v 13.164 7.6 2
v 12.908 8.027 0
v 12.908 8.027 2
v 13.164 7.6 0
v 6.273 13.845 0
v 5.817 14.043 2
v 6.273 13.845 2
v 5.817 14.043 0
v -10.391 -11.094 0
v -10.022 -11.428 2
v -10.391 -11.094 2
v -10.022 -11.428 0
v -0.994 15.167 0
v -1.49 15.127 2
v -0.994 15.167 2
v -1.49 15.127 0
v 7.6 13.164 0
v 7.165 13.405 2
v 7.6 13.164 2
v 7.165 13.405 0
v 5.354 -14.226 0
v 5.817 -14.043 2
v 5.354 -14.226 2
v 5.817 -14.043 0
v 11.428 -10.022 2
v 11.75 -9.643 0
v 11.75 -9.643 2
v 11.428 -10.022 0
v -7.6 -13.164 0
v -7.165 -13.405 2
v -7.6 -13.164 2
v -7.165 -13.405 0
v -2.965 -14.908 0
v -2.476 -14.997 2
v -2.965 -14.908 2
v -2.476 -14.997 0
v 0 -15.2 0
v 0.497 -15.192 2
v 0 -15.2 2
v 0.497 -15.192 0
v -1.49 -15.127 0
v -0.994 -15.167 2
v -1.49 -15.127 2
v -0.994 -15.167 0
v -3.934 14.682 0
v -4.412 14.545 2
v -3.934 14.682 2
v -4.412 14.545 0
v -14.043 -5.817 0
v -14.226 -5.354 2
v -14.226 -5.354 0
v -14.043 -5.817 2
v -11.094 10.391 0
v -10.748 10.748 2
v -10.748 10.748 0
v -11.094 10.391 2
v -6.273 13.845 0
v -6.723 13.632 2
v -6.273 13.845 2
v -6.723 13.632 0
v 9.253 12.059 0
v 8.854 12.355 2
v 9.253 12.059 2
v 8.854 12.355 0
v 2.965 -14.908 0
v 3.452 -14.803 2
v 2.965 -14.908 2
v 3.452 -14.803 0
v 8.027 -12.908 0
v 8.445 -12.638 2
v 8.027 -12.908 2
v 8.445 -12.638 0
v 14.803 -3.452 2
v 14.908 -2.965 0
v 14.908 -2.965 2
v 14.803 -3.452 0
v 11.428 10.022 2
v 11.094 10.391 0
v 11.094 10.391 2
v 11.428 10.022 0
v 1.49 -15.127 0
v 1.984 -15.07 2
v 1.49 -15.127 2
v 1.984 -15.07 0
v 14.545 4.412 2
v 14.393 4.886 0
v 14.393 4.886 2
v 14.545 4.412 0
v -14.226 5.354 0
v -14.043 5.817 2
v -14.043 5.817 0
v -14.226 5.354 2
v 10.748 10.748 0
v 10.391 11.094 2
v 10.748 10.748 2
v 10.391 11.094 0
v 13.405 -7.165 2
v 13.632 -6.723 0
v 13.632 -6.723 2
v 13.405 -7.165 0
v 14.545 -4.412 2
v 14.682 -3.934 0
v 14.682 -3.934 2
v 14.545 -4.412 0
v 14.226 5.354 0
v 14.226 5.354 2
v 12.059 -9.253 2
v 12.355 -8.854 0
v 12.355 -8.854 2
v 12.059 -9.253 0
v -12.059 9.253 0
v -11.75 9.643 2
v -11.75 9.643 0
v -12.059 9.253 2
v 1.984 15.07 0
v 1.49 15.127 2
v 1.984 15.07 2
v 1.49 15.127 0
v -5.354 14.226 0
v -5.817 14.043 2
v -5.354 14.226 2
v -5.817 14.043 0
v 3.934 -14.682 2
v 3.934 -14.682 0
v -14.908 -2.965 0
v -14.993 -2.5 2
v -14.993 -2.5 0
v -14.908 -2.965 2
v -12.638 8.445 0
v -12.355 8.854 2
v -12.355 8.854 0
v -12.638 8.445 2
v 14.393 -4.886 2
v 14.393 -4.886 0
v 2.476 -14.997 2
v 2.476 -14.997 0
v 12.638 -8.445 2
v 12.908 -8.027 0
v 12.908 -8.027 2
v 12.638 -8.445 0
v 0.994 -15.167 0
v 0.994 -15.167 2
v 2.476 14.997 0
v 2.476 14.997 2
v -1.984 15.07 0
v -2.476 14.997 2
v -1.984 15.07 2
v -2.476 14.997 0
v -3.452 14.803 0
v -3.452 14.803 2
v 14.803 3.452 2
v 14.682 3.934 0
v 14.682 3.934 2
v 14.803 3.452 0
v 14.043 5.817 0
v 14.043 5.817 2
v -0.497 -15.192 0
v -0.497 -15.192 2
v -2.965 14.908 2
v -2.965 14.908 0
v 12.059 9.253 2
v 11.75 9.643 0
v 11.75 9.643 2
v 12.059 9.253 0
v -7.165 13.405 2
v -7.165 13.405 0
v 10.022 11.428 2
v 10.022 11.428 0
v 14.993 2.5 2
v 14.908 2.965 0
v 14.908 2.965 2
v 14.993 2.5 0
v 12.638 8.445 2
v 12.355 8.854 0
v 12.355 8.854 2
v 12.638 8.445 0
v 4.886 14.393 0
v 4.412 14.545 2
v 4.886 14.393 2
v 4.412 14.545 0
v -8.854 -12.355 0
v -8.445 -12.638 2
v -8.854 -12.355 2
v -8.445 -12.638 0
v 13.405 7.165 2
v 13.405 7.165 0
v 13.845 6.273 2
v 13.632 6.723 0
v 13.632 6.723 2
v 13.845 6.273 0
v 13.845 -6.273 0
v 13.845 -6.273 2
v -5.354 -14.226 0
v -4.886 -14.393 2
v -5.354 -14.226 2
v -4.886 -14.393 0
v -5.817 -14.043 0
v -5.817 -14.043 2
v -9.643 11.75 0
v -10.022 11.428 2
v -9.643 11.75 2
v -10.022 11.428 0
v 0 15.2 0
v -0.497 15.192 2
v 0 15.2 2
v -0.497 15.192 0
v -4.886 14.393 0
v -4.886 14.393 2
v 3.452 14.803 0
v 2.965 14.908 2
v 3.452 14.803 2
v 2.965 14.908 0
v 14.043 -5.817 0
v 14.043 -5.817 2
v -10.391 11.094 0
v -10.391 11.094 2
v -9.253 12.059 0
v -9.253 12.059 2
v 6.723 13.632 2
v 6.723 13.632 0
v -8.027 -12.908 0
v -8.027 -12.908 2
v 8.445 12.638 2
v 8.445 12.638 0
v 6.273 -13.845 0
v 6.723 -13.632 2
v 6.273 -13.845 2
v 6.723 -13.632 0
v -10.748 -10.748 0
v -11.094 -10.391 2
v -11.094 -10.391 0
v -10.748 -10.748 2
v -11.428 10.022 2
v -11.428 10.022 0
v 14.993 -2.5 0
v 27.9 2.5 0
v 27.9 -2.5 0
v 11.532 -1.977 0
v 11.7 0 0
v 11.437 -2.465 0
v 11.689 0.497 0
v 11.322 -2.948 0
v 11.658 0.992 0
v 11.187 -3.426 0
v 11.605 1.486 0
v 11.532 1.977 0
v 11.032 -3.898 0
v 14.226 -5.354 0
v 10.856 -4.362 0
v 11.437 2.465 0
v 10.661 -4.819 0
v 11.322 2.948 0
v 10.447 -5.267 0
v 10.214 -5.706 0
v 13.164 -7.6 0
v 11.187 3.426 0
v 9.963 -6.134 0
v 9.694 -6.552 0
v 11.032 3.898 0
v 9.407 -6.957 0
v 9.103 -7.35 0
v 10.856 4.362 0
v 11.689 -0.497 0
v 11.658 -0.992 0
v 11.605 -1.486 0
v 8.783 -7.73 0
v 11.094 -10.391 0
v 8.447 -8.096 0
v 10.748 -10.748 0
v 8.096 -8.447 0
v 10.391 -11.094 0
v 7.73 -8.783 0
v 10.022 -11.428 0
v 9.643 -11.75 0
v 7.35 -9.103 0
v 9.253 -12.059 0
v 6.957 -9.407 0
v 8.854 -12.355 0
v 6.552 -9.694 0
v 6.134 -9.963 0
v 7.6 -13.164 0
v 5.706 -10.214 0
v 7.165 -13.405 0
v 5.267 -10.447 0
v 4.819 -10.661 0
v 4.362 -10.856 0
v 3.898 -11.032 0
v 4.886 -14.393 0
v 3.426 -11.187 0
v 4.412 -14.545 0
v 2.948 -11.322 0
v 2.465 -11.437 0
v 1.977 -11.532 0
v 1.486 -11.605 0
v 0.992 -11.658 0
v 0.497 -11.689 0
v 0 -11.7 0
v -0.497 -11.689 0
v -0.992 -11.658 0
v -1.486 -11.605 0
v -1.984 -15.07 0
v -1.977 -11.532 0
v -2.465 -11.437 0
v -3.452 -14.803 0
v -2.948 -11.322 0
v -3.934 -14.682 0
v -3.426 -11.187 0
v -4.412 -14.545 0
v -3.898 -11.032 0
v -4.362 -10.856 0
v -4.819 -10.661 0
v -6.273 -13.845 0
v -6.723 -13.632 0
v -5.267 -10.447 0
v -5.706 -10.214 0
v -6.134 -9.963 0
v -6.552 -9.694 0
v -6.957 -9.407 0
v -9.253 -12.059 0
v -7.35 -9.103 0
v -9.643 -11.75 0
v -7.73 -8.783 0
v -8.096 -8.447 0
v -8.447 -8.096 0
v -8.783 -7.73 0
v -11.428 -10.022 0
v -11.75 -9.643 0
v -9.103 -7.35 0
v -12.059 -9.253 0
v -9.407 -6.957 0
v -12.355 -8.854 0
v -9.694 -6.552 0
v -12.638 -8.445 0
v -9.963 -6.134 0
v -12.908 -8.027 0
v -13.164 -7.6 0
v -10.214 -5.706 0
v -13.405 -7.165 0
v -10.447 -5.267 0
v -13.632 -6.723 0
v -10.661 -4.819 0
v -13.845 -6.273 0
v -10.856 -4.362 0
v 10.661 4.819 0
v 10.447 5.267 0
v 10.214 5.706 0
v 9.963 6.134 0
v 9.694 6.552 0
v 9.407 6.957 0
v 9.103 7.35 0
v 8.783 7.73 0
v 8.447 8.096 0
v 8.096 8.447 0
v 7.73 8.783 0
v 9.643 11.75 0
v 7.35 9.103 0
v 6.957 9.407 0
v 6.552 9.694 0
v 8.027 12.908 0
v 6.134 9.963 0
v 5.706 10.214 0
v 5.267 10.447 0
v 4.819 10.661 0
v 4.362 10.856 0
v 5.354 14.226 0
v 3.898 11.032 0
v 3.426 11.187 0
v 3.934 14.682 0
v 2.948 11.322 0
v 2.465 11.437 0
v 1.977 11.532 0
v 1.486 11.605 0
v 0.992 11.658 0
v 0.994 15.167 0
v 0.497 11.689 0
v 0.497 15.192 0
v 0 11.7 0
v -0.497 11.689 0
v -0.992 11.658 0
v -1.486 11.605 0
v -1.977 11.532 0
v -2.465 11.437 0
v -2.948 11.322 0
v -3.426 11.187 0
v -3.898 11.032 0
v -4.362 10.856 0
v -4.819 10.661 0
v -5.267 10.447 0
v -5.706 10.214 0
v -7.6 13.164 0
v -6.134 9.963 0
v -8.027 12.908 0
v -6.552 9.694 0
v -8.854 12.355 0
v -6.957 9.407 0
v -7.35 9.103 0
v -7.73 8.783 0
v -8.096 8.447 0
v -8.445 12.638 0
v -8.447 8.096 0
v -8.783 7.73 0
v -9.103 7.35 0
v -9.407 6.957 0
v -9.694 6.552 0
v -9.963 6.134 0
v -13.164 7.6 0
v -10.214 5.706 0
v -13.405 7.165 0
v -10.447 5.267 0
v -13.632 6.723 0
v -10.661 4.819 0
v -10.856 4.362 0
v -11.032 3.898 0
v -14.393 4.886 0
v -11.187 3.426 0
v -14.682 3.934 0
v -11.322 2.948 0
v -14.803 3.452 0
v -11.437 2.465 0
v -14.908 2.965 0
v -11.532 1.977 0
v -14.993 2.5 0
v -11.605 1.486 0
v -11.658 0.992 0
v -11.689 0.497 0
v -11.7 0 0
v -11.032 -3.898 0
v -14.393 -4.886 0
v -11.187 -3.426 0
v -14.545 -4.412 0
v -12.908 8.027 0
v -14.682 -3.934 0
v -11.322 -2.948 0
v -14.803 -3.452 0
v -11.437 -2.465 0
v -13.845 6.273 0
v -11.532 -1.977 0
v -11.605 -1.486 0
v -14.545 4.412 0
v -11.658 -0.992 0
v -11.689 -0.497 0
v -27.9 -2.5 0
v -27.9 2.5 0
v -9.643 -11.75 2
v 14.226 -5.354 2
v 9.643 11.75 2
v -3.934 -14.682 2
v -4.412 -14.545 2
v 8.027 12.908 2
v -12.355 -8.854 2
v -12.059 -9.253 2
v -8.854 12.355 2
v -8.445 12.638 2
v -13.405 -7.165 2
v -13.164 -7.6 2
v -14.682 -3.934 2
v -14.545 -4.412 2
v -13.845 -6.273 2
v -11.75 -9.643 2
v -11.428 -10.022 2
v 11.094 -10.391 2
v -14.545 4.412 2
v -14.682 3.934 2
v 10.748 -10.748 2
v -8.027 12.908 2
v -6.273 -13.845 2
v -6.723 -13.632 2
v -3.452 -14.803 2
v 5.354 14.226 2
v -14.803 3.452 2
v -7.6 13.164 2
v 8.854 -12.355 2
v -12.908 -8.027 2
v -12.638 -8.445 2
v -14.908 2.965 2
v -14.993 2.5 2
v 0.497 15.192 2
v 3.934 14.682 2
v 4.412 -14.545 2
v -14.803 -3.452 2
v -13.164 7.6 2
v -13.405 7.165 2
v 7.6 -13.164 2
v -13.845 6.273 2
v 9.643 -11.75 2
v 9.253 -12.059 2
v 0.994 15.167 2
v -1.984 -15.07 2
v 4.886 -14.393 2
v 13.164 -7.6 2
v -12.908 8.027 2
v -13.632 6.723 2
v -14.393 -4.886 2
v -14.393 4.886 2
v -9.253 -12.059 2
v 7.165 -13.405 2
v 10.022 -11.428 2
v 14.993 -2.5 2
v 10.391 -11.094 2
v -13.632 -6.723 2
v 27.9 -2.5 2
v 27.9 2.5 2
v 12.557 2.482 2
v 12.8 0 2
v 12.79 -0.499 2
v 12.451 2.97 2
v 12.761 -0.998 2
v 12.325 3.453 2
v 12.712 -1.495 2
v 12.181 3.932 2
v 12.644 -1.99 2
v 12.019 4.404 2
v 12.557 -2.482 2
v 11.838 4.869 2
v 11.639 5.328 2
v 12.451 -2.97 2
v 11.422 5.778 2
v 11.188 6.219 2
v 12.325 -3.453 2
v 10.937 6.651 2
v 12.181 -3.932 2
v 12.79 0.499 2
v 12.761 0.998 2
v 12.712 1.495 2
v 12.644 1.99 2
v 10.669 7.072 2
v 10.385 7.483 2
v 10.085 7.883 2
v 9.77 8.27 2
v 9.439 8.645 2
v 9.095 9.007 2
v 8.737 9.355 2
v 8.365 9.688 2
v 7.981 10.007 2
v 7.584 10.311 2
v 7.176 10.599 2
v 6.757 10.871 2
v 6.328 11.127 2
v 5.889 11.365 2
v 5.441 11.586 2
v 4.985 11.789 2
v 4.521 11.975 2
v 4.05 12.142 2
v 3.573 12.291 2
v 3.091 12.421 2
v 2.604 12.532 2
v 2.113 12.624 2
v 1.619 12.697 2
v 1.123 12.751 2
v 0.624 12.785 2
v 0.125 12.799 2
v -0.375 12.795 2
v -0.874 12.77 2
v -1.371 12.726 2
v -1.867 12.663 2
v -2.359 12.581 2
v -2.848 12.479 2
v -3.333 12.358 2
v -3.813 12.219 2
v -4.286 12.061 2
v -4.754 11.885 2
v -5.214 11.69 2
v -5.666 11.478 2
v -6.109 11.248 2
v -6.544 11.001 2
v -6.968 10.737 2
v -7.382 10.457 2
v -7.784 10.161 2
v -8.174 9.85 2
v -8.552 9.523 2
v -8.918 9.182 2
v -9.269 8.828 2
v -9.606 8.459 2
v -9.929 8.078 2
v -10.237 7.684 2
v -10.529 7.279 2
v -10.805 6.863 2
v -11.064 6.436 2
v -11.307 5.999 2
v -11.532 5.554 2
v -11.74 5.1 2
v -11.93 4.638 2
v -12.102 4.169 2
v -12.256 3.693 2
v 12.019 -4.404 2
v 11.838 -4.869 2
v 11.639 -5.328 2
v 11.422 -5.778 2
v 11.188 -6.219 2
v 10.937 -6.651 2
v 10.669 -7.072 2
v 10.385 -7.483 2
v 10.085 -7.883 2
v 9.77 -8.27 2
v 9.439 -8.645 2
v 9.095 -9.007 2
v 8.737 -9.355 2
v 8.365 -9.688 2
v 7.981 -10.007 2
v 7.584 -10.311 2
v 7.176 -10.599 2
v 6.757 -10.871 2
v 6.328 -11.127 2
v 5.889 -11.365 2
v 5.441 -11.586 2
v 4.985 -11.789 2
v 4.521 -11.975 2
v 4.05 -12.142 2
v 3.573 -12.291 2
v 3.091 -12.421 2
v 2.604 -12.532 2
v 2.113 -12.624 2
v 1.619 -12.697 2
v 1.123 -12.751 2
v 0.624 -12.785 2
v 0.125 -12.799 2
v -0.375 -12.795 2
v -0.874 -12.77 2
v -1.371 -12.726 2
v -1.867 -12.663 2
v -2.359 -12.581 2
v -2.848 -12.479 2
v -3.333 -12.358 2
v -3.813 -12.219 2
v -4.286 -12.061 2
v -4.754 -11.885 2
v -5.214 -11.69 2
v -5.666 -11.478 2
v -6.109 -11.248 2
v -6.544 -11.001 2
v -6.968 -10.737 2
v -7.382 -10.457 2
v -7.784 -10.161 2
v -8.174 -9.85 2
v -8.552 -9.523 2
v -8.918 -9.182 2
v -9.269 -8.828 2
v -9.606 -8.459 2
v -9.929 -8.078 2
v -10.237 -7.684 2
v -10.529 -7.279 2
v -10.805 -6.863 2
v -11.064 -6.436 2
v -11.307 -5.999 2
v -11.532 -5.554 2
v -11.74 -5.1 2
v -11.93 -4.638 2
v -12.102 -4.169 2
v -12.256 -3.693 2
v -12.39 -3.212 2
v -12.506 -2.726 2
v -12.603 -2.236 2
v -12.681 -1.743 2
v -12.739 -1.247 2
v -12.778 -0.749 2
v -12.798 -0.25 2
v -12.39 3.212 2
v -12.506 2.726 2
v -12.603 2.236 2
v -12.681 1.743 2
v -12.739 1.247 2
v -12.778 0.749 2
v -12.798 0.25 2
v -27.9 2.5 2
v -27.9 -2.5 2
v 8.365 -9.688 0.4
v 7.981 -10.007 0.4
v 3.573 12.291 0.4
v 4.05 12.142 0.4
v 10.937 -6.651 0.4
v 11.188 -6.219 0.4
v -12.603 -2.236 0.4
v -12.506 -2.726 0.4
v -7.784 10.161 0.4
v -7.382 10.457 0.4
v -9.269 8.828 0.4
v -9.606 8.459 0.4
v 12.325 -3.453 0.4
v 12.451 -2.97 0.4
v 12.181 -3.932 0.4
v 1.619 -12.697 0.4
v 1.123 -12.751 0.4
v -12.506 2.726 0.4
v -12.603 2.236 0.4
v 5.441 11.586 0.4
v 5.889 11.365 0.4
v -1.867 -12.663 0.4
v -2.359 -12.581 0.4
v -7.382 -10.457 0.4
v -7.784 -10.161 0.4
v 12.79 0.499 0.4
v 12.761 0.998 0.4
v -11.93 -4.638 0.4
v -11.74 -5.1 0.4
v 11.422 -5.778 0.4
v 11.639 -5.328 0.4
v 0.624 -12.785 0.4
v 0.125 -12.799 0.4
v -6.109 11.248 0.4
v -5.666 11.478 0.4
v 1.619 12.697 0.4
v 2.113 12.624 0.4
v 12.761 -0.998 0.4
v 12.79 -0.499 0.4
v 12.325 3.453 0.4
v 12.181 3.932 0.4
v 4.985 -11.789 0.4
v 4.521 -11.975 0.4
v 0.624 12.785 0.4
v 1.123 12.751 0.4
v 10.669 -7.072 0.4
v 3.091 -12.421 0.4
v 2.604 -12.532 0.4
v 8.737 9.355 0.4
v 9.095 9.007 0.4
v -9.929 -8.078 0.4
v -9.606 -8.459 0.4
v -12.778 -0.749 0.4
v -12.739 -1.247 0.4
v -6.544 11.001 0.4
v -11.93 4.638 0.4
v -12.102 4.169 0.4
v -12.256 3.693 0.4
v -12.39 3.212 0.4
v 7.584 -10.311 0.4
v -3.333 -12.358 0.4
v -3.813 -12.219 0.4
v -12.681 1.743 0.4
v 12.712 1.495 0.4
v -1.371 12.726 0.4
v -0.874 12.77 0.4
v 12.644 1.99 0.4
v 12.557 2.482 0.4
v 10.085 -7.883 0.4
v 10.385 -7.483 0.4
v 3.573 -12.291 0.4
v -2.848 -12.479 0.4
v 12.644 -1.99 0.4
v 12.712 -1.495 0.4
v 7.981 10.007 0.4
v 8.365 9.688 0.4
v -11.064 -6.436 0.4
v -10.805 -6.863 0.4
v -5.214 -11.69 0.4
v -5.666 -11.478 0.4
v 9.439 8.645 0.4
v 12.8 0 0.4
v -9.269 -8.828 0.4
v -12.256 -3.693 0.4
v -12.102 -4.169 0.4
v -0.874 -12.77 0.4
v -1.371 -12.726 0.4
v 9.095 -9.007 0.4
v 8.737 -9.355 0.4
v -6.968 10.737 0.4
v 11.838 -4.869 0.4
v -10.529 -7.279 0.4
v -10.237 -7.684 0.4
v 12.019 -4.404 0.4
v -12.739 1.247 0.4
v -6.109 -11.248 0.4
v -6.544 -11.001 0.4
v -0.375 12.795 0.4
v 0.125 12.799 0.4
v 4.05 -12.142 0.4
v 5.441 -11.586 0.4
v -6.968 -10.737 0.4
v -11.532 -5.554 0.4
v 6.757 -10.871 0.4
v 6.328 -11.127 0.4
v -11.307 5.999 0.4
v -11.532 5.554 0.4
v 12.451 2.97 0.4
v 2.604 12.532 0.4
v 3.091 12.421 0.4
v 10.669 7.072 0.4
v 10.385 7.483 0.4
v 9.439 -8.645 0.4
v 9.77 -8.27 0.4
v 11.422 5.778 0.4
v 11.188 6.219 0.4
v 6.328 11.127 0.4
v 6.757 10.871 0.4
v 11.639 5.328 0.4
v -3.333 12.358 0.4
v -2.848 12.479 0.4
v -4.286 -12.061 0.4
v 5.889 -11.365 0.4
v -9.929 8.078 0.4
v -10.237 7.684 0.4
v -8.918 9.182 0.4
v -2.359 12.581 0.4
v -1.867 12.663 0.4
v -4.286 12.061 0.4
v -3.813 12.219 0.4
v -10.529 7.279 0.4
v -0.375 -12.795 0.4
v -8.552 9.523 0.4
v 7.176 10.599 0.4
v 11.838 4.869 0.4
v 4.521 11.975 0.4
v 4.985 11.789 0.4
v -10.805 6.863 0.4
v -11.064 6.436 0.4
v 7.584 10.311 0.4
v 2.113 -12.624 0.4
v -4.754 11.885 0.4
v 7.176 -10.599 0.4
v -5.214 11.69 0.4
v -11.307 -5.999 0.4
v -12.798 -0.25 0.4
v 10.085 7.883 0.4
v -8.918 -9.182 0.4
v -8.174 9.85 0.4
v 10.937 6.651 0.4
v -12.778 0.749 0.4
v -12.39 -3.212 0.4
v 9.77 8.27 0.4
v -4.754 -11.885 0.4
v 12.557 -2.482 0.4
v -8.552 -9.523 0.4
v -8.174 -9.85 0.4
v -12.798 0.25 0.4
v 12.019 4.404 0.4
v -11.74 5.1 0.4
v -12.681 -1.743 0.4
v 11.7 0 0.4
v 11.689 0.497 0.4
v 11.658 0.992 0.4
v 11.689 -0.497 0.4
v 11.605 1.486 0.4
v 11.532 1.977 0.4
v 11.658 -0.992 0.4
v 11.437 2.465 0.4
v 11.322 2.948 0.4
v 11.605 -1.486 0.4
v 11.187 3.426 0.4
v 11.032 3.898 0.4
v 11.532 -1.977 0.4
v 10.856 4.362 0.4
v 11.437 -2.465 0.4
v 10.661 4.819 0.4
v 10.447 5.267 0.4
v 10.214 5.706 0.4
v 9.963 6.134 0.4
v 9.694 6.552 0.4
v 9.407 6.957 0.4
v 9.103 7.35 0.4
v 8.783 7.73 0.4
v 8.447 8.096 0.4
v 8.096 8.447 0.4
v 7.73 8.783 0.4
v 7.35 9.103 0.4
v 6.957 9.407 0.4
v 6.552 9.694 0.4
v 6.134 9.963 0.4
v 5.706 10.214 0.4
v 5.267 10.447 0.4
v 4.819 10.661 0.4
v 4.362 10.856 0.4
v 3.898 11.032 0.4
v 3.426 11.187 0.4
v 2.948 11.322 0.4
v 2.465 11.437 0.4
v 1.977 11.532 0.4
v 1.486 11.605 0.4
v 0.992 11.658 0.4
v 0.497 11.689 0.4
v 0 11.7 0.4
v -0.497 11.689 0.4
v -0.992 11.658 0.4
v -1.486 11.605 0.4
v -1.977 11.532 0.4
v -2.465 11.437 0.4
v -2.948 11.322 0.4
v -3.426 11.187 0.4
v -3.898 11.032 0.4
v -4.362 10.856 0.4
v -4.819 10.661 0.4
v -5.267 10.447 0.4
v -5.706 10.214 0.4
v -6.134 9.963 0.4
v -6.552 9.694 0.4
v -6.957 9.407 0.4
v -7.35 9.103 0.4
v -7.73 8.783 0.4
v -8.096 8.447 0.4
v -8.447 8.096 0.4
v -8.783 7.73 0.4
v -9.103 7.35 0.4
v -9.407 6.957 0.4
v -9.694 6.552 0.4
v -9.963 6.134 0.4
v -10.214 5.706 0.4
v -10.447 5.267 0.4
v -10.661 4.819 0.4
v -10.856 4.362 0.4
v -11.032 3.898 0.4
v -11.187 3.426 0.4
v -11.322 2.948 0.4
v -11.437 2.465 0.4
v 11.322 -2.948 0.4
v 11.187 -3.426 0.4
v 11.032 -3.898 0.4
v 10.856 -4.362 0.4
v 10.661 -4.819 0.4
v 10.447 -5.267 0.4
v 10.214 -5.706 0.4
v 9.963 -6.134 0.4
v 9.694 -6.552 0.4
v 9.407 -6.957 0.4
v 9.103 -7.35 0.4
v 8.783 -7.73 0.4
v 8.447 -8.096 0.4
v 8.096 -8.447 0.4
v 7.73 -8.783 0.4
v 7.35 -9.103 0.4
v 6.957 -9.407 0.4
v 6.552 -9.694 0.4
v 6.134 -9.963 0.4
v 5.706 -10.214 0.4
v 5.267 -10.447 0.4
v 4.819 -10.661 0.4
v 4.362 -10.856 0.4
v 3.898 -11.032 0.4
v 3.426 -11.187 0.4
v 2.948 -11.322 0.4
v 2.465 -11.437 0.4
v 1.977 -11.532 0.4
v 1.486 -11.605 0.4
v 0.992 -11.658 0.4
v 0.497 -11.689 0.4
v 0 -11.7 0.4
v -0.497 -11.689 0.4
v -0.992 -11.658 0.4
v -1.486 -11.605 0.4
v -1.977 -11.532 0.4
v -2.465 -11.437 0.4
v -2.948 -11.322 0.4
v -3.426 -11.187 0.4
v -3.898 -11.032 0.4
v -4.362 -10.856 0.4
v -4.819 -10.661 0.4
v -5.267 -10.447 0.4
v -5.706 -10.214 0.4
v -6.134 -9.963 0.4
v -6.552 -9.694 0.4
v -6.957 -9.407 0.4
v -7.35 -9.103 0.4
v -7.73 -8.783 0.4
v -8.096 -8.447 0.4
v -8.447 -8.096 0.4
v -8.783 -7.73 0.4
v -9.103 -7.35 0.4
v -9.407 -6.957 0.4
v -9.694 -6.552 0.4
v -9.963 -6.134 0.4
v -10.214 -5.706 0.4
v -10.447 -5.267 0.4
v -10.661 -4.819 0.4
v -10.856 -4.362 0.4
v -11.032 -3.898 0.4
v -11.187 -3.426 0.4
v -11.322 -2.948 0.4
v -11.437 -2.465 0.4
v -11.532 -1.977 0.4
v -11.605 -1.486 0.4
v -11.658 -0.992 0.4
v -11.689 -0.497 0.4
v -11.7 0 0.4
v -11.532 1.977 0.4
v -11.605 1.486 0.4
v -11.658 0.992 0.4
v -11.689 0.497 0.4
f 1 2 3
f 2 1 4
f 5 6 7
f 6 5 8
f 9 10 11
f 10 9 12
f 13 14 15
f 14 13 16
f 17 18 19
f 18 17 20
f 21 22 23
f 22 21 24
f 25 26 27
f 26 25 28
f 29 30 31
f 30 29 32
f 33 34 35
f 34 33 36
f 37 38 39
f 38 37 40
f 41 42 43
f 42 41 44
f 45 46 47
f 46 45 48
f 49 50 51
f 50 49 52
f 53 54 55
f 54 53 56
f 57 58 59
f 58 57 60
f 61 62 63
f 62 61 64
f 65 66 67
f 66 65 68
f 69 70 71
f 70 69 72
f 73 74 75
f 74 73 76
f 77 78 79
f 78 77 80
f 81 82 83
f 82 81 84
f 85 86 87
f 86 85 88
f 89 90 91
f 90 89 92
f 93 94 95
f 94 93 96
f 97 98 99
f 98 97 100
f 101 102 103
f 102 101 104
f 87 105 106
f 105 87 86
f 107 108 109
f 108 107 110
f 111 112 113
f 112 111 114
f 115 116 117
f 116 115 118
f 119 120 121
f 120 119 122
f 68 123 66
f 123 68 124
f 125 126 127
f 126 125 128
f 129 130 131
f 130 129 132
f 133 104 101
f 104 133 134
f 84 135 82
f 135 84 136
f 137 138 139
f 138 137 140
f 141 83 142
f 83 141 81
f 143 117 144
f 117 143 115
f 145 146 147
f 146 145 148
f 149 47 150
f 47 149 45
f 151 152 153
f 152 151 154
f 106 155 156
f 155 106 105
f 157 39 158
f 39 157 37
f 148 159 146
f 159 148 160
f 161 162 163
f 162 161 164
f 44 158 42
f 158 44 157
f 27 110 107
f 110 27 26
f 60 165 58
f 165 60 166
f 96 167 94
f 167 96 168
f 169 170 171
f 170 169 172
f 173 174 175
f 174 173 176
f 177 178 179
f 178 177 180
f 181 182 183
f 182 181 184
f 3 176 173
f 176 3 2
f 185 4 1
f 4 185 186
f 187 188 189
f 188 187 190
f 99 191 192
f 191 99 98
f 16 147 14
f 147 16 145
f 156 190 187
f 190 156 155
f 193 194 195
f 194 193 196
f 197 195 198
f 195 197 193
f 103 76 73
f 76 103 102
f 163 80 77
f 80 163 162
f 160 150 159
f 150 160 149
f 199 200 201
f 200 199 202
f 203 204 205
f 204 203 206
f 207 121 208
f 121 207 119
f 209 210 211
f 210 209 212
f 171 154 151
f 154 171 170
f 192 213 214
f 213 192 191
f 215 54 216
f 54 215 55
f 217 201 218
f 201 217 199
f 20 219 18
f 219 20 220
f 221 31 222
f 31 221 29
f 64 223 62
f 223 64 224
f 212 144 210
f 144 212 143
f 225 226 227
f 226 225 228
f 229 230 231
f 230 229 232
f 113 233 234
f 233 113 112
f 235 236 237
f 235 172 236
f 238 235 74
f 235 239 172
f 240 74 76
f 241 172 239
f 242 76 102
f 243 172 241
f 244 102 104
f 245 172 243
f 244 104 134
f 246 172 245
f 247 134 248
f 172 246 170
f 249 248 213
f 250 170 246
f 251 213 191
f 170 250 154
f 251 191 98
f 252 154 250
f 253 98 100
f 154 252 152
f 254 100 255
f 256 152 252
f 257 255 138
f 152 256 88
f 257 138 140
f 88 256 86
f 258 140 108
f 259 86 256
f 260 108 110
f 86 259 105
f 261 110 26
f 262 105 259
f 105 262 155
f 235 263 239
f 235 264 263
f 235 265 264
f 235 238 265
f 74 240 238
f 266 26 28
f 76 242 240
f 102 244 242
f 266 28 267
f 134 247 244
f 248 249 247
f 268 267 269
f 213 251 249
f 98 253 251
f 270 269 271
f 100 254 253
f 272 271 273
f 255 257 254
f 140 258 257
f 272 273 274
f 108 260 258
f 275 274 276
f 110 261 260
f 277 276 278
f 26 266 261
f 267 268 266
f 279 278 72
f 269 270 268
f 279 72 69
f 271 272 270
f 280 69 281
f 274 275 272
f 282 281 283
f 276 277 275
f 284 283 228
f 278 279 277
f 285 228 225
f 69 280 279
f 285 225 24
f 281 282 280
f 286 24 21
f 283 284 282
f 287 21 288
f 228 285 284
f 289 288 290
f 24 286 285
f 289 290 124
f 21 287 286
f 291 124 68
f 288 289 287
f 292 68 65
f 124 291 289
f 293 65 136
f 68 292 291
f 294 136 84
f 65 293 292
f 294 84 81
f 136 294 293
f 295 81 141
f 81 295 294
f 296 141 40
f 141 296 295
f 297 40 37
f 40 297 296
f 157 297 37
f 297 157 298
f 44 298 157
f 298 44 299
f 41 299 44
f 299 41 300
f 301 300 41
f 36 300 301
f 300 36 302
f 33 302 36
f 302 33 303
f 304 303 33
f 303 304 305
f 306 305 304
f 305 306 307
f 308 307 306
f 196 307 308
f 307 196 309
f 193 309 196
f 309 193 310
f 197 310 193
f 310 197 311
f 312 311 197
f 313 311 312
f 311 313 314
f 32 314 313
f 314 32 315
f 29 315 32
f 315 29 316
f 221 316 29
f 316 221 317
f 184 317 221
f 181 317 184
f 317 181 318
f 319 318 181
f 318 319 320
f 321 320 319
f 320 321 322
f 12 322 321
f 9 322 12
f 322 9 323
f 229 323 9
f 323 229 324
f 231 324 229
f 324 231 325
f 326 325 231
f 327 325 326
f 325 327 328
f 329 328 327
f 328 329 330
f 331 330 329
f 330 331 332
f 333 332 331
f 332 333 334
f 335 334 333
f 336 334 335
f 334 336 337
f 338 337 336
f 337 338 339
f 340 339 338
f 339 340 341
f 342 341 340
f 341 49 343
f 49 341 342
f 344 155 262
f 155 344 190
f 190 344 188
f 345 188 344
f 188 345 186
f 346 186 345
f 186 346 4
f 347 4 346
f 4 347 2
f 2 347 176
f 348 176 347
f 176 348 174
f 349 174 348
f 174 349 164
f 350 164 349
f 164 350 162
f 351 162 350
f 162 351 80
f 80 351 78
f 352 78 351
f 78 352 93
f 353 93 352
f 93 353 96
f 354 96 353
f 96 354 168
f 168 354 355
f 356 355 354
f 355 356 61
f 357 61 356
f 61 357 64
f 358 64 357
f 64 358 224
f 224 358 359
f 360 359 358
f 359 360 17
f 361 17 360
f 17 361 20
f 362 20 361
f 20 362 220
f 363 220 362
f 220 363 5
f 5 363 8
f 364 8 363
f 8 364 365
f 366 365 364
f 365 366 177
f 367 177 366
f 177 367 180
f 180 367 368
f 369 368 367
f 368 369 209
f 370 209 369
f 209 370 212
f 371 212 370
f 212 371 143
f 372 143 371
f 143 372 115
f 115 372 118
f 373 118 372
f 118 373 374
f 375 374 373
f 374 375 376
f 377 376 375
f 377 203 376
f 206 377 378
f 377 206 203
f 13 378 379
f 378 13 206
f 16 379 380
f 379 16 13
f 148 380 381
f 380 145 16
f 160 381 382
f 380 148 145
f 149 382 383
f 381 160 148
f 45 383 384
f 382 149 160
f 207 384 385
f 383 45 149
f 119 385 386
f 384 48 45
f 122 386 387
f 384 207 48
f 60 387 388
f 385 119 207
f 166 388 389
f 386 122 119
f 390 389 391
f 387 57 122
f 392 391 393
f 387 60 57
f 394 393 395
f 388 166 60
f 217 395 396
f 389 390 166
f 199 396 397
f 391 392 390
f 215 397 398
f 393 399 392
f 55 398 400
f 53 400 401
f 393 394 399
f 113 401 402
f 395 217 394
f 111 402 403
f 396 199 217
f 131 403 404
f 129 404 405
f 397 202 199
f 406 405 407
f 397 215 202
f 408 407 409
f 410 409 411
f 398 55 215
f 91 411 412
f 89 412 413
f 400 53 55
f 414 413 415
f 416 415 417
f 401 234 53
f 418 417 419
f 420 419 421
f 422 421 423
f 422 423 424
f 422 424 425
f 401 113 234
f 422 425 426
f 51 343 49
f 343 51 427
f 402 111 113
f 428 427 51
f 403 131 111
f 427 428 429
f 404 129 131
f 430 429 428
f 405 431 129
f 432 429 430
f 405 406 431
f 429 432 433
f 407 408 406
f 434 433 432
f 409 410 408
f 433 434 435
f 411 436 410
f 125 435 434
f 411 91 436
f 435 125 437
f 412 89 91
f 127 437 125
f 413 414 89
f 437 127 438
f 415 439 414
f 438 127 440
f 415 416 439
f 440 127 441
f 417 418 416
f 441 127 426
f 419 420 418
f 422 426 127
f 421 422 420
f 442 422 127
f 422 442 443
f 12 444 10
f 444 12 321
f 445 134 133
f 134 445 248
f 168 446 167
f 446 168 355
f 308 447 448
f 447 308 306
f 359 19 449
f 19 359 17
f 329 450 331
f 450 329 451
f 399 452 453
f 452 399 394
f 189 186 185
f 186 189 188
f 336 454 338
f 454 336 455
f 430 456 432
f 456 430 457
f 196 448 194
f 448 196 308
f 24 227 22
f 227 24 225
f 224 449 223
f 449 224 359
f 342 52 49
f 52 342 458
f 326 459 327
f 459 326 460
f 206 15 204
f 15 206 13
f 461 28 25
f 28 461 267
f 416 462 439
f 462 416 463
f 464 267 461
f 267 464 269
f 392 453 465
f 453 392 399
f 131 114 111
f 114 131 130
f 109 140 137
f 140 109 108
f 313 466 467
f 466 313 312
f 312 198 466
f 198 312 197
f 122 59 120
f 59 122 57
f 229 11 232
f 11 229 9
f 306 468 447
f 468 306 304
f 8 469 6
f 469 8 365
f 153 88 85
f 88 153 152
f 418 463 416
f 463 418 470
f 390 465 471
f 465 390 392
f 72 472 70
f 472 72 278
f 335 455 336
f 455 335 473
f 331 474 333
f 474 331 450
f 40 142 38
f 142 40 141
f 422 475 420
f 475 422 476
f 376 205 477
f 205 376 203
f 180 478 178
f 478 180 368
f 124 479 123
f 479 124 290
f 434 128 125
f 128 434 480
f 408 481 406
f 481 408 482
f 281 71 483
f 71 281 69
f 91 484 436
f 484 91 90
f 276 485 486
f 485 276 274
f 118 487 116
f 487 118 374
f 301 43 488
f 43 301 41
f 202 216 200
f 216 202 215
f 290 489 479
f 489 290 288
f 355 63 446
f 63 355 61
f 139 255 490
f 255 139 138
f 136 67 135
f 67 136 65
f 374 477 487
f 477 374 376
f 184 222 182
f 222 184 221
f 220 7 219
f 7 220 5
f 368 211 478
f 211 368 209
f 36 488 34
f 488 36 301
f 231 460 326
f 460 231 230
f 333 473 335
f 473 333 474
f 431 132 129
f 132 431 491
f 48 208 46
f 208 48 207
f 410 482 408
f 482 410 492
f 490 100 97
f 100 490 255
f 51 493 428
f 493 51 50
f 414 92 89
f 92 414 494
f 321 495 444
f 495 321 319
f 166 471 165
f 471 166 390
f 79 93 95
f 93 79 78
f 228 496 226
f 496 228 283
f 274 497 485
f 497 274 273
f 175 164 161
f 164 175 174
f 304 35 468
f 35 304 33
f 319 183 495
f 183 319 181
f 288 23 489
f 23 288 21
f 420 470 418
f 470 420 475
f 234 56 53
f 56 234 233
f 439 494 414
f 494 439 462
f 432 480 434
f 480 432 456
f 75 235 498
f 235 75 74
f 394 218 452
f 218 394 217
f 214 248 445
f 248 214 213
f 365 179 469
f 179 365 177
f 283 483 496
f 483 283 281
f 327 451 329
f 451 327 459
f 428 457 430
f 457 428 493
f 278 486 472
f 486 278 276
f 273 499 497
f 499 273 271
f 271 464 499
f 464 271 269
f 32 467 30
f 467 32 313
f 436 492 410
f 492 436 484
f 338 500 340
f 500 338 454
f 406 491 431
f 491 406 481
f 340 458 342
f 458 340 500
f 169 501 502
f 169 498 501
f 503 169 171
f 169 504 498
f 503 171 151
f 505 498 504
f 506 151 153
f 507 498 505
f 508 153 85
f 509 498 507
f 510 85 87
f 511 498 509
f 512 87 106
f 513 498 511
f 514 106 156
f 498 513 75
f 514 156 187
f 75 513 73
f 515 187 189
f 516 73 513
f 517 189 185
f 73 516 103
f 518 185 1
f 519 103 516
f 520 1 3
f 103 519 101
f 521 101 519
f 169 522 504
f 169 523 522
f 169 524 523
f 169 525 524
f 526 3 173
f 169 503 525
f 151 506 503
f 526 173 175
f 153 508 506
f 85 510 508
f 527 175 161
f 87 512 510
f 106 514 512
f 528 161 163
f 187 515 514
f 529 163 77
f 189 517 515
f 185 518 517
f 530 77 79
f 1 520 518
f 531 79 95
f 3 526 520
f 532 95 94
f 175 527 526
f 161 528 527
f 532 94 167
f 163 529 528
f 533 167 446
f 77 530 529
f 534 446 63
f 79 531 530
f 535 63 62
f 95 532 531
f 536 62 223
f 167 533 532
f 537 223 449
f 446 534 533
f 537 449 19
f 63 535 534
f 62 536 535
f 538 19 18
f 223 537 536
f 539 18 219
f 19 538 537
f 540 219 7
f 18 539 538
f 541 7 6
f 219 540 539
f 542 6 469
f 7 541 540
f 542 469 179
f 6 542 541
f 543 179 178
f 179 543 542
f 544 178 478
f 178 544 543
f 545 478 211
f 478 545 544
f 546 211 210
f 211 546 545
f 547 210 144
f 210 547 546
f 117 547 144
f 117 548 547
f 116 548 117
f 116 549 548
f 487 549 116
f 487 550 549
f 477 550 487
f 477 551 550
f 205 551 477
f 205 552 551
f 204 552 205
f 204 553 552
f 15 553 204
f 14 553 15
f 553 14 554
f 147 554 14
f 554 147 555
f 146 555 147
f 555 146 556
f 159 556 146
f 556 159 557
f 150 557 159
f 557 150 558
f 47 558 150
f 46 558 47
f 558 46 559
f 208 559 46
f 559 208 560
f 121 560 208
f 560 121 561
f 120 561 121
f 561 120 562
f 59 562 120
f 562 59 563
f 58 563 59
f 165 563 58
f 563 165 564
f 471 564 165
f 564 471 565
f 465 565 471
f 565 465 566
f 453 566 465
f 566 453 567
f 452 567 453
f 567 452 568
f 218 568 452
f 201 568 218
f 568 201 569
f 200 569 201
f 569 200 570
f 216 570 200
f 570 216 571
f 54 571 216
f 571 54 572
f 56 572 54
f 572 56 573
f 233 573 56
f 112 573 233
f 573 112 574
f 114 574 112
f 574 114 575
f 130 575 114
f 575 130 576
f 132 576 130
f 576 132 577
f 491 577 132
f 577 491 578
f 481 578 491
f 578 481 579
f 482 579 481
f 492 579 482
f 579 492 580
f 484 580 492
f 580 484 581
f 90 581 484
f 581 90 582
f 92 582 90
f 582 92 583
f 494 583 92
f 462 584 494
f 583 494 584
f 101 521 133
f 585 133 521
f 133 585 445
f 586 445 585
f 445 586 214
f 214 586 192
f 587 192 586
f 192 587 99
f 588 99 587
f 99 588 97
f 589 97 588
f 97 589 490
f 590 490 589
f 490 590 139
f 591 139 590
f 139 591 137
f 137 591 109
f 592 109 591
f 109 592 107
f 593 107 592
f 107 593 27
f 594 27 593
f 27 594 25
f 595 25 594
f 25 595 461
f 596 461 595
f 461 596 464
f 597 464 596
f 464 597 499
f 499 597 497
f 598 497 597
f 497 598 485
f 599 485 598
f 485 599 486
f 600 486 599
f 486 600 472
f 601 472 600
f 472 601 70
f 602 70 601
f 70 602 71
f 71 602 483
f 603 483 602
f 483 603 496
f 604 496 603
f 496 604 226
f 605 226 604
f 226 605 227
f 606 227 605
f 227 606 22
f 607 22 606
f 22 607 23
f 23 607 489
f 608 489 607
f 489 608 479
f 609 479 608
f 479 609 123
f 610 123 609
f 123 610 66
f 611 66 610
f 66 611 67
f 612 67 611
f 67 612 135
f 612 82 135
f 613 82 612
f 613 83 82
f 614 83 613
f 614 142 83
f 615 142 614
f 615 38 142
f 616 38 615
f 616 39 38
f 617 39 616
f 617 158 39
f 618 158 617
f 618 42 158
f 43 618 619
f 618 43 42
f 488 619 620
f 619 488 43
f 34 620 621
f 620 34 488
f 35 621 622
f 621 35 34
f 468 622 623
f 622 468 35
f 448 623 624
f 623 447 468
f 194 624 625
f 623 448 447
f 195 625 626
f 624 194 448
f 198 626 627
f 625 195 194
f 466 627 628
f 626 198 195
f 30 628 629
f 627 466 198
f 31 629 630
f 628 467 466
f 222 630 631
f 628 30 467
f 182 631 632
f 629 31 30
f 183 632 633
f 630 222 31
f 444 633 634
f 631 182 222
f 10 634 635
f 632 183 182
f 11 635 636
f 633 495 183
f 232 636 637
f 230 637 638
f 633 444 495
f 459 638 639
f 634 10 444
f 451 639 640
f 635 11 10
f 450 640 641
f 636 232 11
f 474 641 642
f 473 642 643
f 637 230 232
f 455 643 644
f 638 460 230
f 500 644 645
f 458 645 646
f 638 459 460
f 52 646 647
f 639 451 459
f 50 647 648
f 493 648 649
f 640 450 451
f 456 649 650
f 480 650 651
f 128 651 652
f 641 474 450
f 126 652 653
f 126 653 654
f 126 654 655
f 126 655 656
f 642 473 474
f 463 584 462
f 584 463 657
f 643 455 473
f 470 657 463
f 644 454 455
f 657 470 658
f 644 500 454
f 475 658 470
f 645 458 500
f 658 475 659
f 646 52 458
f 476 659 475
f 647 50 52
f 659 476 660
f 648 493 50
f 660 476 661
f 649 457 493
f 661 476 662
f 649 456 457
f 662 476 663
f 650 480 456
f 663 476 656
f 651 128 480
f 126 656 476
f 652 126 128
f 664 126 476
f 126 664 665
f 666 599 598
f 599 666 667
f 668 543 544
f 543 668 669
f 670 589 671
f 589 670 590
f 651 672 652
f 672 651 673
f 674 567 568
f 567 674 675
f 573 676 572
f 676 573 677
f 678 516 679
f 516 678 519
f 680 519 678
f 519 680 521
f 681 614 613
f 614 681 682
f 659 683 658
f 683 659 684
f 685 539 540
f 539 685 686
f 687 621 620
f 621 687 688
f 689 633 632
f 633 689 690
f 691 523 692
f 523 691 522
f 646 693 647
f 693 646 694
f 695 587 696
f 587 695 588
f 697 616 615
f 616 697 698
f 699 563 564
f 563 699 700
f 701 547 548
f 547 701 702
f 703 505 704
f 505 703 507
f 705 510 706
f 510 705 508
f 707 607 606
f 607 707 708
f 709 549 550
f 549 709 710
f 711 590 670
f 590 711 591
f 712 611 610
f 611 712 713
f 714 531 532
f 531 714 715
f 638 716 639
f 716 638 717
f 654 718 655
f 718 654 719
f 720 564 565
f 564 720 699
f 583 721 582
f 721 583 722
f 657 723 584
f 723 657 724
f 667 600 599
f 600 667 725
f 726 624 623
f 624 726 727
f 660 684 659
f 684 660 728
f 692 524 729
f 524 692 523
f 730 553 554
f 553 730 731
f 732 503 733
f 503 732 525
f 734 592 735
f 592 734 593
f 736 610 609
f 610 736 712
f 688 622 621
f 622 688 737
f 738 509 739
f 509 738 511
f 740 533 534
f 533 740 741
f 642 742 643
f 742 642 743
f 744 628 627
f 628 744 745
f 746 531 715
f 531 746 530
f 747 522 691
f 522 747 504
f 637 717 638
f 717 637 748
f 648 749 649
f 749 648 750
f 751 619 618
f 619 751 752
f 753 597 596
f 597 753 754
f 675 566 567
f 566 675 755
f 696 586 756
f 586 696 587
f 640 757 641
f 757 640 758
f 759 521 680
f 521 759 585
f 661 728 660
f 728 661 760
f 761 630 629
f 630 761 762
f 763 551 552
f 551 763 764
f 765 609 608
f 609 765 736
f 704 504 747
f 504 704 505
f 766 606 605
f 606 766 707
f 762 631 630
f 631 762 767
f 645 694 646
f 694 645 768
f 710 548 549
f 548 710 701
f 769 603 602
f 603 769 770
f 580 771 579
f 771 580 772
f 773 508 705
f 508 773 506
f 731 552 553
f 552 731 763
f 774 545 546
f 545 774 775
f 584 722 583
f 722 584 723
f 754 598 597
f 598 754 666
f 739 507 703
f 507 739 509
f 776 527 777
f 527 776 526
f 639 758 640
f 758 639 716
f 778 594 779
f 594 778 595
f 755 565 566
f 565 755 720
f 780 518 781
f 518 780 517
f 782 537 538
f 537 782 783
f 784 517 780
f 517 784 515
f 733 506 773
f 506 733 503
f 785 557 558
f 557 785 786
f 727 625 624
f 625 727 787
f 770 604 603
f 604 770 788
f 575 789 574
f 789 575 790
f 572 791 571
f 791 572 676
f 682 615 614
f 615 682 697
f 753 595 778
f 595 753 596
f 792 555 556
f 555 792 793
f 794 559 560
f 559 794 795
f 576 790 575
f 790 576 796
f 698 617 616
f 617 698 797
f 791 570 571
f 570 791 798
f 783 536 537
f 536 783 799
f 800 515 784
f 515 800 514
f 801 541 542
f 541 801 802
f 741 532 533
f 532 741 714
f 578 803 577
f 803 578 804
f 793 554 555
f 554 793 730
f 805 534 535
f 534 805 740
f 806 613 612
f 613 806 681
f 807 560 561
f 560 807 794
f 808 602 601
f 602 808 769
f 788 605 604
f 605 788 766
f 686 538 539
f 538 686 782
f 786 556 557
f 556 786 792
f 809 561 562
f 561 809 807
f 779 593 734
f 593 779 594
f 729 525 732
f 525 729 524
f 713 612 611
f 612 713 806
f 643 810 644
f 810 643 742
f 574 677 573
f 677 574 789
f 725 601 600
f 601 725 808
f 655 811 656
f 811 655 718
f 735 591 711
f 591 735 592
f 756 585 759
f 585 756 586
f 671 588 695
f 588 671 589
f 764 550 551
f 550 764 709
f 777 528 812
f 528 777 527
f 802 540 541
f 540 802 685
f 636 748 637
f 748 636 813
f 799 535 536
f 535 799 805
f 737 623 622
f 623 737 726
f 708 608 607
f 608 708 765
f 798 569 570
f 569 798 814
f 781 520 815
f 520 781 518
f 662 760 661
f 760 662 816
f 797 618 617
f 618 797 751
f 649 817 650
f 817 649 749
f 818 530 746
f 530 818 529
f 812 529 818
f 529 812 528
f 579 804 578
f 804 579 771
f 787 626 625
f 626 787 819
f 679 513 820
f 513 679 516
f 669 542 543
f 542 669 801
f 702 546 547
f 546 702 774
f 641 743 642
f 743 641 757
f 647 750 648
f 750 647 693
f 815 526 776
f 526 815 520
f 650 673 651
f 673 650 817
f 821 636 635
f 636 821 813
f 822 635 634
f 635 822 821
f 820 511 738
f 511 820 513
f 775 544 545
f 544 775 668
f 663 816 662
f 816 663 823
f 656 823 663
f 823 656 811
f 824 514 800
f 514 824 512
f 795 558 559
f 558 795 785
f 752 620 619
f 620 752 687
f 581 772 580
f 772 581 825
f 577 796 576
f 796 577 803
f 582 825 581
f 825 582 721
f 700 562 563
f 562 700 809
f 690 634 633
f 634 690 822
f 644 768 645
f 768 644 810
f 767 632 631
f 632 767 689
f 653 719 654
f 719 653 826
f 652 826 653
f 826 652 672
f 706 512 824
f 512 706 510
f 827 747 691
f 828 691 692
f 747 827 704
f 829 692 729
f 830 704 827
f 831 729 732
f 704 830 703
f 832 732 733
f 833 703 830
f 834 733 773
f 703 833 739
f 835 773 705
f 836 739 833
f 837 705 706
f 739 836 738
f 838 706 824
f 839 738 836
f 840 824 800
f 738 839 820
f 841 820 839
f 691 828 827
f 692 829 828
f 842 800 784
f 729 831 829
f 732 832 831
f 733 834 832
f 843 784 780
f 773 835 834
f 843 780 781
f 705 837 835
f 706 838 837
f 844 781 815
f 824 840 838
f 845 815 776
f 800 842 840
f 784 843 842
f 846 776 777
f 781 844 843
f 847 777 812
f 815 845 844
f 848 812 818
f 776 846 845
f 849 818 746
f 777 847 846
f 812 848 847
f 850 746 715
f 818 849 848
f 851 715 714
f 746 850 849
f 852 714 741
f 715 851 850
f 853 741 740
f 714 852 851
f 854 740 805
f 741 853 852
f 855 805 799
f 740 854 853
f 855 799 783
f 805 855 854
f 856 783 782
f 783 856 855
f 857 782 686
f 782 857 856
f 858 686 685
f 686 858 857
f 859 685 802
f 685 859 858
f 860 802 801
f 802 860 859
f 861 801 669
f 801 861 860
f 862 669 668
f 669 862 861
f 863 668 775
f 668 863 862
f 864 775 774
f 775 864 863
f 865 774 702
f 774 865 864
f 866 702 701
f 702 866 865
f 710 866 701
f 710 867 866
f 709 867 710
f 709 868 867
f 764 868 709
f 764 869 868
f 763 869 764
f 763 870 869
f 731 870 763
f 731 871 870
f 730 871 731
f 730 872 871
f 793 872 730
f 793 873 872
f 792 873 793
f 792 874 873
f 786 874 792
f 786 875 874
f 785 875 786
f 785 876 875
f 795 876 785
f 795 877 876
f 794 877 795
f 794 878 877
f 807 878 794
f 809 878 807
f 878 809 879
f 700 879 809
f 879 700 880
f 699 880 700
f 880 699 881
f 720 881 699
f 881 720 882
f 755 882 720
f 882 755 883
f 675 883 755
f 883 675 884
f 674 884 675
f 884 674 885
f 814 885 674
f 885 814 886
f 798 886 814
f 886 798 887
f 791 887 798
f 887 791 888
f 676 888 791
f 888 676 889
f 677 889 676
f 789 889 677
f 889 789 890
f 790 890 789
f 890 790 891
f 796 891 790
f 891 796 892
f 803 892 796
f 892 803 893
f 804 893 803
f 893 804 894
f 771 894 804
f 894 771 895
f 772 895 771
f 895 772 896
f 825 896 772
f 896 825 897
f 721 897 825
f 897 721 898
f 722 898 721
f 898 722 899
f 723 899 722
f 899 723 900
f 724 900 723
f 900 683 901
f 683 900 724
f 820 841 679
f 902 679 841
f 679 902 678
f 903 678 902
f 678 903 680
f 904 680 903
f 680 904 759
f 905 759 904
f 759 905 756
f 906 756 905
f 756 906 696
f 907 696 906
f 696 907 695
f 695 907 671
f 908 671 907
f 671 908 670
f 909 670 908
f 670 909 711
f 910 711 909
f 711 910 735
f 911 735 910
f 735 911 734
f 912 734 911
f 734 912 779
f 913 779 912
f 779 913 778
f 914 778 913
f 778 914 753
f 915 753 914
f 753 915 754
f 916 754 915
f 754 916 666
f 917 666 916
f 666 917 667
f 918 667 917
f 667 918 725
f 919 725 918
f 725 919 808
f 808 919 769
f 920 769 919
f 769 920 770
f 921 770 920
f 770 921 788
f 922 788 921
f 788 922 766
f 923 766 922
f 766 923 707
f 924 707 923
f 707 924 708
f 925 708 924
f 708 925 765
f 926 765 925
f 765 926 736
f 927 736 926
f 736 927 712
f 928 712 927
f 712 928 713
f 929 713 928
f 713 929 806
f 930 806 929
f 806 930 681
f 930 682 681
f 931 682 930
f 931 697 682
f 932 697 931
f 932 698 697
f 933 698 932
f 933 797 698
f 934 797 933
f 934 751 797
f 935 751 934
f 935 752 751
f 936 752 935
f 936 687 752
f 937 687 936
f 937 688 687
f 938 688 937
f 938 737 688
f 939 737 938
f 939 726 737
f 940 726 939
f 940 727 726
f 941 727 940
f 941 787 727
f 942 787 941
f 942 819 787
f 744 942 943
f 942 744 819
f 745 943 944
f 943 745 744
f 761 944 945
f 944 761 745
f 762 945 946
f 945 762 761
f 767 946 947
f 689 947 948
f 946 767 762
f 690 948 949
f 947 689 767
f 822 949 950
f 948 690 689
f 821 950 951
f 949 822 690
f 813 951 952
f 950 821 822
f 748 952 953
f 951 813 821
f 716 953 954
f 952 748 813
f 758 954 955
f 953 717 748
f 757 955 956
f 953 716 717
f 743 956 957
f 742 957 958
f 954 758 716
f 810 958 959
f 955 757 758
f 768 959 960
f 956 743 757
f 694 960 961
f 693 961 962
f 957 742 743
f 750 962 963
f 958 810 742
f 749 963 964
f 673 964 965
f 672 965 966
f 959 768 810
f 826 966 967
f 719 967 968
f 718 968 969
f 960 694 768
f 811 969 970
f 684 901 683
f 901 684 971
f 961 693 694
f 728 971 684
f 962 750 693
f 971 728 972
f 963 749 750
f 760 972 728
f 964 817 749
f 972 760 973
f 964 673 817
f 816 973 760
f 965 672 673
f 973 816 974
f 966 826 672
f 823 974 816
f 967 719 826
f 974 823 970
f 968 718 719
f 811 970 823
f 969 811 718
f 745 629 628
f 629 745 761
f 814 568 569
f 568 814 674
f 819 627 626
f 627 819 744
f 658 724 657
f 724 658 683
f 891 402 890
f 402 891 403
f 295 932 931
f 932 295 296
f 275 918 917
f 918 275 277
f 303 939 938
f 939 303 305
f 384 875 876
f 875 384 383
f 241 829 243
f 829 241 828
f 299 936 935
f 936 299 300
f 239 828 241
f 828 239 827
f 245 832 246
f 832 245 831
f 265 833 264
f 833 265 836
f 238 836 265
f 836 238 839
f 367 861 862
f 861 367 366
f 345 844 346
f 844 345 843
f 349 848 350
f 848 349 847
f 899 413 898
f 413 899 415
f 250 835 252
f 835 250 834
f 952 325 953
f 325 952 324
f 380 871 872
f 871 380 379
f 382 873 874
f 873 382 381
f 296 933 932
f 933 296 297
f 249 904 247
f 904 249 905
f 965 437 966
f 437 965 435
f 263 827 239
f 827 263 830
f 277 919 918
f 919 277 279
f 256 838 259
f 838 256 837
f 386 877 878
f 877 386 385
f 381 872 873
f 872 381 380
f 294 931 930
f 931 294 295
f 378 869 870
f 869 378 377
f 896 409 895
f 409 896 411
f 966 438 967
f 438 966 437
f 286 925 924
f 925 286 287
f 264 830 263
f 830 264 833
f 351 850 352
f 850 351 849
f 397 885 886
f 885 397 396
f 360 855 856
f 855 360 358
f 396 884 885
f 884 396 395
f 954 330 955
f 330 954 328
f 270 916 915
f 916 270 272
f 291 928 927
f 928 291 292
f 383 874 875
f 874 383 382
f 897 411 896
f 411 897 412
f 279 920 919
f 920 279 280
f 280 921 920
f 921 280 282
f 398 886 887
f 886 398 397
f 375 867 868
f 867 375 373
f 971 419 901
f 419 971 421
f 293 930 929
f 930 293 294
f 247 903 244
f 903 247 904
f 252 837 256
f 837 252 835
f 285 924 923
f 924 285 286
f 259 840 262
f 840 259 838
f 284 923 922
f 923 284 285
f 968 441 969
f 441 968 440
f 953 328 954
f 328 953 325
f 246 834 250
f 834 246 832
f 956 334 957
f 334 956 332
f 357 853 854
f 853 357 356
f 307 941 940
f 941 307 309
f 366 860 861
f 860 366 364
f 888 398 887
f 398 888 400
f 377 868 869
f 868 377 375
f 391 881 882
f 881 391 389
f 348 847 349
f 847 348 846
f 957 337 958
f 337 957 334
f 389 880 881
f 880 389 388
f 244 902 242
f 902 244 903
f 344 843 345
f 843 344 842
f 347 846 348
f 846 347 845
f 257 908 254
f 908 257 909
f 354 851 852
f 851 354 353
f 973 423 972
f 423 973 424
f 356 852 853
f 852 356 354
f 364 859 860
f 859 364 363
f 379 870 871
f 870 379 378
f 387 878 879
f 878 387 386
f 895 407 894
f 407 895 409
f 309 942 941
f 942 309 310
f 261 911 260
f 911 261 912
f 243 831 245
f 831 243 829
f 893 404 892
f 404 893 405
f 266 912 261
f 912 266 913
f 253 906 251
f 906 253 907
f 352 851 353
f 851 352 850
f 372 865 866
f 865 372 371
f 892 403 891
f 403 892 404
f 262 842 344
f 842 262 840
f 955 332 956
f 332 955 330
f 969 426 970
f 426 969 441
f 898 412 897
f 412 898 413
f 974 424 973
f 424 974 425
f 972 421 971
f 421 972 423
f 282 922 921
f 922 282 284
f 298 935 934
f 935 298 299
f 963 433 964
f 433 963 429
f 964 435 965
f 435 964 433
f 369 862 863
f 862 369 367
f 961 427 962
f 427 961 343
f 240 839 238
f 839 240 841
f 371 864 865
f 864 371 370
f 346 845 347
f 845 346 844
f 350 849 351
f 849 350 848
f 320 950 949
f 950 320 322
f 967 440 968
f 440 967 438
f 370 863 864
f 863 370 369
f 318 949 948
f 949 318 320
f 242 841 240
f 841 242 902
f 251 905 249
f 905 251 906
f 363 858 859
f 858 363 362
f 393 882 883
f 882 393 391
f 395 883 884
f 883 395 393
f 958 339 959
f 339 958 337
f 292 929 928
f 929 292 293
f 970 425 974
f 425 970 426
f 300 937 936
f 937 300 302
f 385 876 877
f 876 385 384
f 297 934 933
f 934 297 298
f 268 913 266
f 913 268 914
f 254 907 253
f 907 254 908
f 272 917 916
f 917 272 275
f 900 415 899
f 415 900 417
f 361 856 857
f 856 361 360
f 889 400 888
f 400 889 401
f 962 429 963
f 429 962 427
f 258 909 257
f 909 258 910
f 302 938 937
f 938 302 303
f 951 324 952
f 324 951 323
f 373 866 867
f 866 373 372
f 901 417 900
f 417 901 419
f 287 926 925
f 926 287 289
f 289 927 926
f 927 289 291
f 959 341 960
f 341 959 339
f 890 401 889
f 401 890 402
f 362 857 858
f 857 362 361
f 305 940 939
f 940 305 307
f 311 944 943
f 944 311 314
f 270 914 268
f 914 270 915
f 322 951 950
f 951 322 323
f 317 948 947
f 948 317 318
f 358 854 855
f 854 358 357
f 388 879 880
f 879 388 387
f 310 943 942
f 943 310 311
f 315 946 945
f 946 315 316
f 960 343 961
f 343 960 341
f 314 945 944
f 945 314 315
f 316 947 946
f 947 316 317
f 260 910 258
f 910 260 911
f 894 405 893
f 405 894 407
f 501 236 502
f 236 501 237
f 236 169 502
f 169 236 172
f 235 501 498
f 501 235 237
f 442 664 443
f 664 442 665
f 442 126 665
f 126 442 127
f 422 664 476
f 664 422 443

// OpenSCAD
/*
  https://www.thorlabs.com/newgrouppage9.cfm?objectgroup_id=4338
*/


$fa = 0.5;
$fs = 0.5;

function resolutionTargetDiameter() = 25.4; // Diameter of target [mm]
function resolutionTargetDiameterMargin() = 0.2; // Margin for fit of target [mm]
function holderThickness() = 2; // Thickness of mount [mm]
function ringThickness() = 1.6 + resolutionTargetLipThickness(); // Thickness of mount [mm]
function tabDimensions() = [15, 5, holderThickness()]; // Dimensions for tabs [mm]
function resolutionTargetLipThickness() = 0.4; // Height of the lip to hold the target [mm]

echo(str("Overall length is: ",2*tabDimensions()[0]+resolutionTargetDiameter()+1));


module CircularResolutionTargetHolder() {
  translate([resolutionTargetDiameter()/2+resolutionTargetDiameterMargin(), -tabDimensions()[1]/2, 0]) cube(tabDimensions());
  translate([-(resolutionTargetDiameter()/2+resolutionTargetDiameterMargin()), tabDimensions()[1]/2, 0]) rotate([0, 0, 180]) cube(tabDimensions());
  difference() {
    translate([0, 0, 0]) cylinder(d = resolutionTargetDiameter()+5, h = ringThickness());;
    translate([0, 0, resolutionTargetLipThickness()]) cylinder(d = resolutionTargetDiameter()+resolutionTargetDiameterMargin(), h = ringThickness()+0.1);
    translate([0,0,-holderThickness()]) cylinder(d = resolutionTargetDiameter()-2, h = ringThickness()+2);
  }
   
};

CircularResolutionTargetHolder();
